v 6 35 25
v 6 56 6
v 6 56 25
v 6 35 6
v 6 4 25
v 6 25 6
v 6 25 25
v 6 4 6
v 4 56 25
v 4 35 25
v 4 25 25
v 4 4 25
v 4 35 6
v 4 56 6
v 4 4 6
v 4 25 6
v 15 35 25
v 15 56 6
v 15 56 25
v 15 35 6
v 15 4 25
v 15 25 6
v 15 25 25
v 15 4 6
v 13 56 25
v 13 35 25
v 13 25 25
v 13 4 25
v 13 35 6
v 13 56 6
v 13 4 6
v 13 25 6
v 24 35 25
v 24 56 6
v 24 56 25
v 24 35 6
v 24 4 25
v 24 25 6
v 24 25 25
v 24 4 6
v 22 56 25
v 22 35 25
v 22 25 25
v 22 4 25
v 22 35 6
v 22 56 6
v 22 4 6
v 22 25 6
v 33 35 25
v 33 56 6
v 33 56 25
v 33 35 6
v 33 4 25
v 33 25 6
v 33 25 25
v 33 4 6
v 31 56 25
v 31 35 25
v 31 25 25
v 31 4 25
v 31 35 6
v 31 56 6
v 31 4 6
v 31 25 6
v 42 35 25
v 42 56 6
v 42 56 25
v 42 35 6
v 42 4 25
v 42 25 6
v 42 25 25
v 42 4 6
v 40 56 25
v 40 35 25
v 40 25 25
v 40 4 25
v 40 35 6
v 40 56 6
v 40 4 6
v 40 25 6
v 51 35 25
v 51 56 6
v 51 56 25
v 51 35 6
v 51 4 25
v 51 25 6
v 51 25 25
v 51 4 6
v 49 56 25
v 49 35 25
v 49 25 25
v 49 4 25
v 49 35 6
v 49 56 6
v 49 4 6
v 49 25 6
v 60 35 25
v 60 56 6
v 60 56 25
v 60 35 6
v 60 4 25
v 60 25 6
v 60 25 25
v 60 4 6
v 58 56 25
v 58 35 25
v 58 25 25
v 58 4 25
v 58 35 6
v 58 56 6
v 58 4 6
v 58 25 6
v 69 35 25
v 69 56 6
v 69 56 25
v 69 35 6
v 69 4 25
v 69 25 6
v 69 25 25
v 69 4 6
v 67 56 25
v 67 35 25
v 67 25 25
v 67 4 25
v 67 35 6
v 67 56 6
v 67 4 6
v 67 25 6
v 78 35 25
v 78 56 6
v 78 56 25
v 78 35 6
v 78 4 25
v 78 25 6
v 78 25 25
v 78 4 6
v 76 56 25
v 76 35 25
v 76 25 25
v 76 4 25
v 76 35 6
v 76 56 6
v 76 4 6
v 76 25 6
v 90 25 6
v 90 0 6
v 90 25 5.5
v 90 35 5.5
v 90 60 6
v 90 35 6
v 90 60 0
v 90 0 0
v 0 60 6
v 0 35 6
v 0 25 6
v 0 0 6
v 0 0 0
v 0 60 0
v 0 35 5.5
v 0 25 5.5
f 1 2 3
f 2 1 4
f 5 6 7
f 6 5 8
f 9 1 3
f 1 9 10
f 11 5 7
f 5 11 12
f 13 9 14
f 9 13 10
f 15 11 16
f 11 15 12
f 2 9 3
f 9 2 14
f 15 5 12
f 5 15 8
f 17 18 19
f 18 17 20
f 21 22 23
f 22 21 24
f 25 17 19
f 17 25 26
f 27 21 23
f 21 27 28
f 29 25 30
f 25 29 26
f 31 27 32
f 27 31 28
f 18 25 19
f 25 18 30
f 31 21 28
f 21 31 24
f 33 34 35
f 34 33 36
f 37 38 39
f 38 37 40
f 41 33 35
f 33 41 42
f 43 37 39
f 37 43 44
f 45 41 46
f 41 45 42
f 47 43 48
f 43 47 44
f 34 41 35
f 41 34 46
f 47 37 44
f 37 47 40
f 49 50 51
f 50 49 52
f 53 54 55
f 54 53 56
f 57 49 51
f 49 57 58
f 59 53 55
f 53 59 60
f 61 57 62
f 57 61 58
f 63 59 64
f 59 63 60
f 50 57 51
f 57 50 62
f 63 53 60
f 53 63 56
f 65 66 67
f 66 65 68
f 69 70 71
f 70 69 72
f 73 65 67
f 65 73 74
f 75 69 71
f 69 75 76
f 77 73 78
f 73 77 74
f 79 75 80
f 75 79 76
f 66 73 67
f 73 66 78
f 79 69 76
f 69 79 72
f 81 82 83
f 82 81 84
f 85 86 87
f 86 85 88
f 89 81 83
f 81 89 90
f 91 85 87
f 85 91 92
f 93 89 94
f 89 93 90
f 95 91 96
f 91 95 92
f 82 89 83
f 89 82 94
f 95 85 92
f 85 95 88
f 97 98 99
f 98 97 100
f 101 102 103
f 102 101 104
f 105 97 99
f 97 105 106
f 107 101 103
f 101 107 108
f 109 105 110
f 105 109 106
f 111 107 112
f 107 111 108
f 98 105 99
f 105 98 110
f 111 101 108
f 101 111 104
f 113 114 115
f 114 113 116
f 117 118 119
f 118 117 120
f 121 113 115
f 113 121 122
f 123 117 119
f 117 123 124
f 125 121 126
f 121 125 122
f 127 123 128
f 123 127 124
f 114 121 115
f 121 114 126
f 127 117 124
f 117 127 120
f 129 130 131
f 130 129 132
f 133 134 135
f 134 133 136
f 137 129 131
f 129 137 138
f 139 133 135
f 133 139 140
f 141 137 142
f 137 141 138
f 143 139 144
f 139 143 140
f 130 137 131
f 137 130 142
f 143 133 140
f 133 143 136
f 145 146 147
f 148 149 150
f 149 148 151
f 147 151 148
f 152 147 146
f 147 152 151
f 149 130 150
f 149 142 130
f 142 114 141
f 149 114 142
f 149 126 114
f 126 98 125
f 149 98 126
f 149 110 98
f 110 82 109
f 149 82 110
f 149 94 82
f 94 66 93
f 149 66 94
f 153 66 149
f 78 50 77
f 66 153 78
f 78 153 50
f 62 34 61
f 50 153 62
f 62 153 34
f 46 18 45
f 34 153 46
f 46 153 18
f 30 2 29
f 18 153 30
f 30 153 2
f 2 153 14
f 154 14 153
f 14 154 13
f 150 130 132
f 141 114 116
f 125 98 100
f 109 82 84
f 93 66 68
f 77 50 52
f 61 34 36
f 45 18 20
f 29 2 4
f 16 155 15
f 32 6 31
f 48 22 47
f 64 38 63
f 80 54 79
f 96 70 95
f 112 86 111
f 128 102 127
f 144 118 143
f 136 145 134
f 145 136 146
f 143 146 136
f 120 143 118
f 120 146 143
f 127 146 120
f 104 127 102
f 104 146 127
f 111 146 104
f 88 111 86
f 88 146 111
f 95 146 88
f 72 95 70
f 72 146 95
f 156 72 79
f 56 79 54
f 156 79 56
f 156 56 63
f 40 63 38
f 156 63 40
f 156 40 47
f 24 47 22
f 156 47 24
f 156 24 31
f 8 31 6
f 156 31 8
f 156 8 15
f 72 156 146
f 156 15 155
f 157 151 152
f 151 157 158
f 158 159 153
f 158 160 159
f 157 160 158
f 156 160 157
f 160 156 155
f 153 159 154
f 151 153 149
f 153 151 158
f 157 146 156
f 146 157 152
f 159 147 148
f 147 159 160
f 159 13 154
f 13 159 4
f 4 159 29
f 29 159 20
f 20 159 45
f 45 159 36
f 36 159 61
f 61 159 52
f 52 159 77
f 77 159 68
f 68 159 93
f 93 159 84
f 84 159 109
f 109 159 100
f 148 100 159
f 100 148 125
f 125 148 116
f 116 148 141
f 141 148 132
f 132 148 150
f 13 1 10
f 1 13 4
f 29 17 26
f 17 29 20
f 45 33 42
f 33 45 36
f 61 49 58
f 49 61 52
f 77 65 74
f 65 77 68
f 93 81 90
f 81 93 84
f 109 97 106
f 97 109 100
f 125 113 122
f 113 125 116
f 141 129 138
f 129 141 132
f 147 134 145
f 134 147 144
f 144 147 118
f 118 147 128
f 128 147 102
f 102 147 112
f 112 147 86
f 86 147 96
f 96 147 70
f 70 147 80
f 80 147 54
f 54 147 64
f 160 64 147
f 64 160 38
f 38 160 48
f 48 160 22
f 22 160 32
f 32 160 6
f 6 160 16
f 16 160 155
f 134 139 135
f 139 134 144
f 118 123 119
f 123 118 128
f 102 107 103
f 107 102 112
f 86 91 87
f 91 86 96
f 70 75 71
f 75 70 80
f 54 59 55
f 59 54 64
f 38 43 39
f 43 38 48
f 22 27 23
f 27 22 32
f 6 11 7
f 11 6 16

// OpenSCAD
$fn = 32;

// ----------------------------------------------------------------------
// Heatsink: slotted fin block
// ----------------------------------------------------------------------

// --- parameters (mm) ---
base_l = 90;              // base length, X
base_w = 60;              // base width, Y
base_t = 6;               // base plate thickness
fin_h = 20;               // fin height above the base
fin_t = 2;                // fin thickness
edge = 4;                 // margin from the base ends
pitch = 9;                // fin pitch
slot_w = 10;              // central slot width, Y

n_fins = floor((base_l - 2 * edge - fin_t) / pitch) + 1;  // fin count
total_h = base_t + fin_h - 1;  // overall height

difference() {
union() {
  cube([base_l, base_w, base_t]);
  for (i = [0 : n_fins - 1])
    translate([edge + i * pitch, edge, base_t - 1])
      cube([fin_t, base_w - 2 * edge, fin_h]);
}
  translate([-1, base_w / 2 - slot_w / 2, base_t - 0.5])
    cube([base_l + 2, slot_w, fin_h + 2]);
}
